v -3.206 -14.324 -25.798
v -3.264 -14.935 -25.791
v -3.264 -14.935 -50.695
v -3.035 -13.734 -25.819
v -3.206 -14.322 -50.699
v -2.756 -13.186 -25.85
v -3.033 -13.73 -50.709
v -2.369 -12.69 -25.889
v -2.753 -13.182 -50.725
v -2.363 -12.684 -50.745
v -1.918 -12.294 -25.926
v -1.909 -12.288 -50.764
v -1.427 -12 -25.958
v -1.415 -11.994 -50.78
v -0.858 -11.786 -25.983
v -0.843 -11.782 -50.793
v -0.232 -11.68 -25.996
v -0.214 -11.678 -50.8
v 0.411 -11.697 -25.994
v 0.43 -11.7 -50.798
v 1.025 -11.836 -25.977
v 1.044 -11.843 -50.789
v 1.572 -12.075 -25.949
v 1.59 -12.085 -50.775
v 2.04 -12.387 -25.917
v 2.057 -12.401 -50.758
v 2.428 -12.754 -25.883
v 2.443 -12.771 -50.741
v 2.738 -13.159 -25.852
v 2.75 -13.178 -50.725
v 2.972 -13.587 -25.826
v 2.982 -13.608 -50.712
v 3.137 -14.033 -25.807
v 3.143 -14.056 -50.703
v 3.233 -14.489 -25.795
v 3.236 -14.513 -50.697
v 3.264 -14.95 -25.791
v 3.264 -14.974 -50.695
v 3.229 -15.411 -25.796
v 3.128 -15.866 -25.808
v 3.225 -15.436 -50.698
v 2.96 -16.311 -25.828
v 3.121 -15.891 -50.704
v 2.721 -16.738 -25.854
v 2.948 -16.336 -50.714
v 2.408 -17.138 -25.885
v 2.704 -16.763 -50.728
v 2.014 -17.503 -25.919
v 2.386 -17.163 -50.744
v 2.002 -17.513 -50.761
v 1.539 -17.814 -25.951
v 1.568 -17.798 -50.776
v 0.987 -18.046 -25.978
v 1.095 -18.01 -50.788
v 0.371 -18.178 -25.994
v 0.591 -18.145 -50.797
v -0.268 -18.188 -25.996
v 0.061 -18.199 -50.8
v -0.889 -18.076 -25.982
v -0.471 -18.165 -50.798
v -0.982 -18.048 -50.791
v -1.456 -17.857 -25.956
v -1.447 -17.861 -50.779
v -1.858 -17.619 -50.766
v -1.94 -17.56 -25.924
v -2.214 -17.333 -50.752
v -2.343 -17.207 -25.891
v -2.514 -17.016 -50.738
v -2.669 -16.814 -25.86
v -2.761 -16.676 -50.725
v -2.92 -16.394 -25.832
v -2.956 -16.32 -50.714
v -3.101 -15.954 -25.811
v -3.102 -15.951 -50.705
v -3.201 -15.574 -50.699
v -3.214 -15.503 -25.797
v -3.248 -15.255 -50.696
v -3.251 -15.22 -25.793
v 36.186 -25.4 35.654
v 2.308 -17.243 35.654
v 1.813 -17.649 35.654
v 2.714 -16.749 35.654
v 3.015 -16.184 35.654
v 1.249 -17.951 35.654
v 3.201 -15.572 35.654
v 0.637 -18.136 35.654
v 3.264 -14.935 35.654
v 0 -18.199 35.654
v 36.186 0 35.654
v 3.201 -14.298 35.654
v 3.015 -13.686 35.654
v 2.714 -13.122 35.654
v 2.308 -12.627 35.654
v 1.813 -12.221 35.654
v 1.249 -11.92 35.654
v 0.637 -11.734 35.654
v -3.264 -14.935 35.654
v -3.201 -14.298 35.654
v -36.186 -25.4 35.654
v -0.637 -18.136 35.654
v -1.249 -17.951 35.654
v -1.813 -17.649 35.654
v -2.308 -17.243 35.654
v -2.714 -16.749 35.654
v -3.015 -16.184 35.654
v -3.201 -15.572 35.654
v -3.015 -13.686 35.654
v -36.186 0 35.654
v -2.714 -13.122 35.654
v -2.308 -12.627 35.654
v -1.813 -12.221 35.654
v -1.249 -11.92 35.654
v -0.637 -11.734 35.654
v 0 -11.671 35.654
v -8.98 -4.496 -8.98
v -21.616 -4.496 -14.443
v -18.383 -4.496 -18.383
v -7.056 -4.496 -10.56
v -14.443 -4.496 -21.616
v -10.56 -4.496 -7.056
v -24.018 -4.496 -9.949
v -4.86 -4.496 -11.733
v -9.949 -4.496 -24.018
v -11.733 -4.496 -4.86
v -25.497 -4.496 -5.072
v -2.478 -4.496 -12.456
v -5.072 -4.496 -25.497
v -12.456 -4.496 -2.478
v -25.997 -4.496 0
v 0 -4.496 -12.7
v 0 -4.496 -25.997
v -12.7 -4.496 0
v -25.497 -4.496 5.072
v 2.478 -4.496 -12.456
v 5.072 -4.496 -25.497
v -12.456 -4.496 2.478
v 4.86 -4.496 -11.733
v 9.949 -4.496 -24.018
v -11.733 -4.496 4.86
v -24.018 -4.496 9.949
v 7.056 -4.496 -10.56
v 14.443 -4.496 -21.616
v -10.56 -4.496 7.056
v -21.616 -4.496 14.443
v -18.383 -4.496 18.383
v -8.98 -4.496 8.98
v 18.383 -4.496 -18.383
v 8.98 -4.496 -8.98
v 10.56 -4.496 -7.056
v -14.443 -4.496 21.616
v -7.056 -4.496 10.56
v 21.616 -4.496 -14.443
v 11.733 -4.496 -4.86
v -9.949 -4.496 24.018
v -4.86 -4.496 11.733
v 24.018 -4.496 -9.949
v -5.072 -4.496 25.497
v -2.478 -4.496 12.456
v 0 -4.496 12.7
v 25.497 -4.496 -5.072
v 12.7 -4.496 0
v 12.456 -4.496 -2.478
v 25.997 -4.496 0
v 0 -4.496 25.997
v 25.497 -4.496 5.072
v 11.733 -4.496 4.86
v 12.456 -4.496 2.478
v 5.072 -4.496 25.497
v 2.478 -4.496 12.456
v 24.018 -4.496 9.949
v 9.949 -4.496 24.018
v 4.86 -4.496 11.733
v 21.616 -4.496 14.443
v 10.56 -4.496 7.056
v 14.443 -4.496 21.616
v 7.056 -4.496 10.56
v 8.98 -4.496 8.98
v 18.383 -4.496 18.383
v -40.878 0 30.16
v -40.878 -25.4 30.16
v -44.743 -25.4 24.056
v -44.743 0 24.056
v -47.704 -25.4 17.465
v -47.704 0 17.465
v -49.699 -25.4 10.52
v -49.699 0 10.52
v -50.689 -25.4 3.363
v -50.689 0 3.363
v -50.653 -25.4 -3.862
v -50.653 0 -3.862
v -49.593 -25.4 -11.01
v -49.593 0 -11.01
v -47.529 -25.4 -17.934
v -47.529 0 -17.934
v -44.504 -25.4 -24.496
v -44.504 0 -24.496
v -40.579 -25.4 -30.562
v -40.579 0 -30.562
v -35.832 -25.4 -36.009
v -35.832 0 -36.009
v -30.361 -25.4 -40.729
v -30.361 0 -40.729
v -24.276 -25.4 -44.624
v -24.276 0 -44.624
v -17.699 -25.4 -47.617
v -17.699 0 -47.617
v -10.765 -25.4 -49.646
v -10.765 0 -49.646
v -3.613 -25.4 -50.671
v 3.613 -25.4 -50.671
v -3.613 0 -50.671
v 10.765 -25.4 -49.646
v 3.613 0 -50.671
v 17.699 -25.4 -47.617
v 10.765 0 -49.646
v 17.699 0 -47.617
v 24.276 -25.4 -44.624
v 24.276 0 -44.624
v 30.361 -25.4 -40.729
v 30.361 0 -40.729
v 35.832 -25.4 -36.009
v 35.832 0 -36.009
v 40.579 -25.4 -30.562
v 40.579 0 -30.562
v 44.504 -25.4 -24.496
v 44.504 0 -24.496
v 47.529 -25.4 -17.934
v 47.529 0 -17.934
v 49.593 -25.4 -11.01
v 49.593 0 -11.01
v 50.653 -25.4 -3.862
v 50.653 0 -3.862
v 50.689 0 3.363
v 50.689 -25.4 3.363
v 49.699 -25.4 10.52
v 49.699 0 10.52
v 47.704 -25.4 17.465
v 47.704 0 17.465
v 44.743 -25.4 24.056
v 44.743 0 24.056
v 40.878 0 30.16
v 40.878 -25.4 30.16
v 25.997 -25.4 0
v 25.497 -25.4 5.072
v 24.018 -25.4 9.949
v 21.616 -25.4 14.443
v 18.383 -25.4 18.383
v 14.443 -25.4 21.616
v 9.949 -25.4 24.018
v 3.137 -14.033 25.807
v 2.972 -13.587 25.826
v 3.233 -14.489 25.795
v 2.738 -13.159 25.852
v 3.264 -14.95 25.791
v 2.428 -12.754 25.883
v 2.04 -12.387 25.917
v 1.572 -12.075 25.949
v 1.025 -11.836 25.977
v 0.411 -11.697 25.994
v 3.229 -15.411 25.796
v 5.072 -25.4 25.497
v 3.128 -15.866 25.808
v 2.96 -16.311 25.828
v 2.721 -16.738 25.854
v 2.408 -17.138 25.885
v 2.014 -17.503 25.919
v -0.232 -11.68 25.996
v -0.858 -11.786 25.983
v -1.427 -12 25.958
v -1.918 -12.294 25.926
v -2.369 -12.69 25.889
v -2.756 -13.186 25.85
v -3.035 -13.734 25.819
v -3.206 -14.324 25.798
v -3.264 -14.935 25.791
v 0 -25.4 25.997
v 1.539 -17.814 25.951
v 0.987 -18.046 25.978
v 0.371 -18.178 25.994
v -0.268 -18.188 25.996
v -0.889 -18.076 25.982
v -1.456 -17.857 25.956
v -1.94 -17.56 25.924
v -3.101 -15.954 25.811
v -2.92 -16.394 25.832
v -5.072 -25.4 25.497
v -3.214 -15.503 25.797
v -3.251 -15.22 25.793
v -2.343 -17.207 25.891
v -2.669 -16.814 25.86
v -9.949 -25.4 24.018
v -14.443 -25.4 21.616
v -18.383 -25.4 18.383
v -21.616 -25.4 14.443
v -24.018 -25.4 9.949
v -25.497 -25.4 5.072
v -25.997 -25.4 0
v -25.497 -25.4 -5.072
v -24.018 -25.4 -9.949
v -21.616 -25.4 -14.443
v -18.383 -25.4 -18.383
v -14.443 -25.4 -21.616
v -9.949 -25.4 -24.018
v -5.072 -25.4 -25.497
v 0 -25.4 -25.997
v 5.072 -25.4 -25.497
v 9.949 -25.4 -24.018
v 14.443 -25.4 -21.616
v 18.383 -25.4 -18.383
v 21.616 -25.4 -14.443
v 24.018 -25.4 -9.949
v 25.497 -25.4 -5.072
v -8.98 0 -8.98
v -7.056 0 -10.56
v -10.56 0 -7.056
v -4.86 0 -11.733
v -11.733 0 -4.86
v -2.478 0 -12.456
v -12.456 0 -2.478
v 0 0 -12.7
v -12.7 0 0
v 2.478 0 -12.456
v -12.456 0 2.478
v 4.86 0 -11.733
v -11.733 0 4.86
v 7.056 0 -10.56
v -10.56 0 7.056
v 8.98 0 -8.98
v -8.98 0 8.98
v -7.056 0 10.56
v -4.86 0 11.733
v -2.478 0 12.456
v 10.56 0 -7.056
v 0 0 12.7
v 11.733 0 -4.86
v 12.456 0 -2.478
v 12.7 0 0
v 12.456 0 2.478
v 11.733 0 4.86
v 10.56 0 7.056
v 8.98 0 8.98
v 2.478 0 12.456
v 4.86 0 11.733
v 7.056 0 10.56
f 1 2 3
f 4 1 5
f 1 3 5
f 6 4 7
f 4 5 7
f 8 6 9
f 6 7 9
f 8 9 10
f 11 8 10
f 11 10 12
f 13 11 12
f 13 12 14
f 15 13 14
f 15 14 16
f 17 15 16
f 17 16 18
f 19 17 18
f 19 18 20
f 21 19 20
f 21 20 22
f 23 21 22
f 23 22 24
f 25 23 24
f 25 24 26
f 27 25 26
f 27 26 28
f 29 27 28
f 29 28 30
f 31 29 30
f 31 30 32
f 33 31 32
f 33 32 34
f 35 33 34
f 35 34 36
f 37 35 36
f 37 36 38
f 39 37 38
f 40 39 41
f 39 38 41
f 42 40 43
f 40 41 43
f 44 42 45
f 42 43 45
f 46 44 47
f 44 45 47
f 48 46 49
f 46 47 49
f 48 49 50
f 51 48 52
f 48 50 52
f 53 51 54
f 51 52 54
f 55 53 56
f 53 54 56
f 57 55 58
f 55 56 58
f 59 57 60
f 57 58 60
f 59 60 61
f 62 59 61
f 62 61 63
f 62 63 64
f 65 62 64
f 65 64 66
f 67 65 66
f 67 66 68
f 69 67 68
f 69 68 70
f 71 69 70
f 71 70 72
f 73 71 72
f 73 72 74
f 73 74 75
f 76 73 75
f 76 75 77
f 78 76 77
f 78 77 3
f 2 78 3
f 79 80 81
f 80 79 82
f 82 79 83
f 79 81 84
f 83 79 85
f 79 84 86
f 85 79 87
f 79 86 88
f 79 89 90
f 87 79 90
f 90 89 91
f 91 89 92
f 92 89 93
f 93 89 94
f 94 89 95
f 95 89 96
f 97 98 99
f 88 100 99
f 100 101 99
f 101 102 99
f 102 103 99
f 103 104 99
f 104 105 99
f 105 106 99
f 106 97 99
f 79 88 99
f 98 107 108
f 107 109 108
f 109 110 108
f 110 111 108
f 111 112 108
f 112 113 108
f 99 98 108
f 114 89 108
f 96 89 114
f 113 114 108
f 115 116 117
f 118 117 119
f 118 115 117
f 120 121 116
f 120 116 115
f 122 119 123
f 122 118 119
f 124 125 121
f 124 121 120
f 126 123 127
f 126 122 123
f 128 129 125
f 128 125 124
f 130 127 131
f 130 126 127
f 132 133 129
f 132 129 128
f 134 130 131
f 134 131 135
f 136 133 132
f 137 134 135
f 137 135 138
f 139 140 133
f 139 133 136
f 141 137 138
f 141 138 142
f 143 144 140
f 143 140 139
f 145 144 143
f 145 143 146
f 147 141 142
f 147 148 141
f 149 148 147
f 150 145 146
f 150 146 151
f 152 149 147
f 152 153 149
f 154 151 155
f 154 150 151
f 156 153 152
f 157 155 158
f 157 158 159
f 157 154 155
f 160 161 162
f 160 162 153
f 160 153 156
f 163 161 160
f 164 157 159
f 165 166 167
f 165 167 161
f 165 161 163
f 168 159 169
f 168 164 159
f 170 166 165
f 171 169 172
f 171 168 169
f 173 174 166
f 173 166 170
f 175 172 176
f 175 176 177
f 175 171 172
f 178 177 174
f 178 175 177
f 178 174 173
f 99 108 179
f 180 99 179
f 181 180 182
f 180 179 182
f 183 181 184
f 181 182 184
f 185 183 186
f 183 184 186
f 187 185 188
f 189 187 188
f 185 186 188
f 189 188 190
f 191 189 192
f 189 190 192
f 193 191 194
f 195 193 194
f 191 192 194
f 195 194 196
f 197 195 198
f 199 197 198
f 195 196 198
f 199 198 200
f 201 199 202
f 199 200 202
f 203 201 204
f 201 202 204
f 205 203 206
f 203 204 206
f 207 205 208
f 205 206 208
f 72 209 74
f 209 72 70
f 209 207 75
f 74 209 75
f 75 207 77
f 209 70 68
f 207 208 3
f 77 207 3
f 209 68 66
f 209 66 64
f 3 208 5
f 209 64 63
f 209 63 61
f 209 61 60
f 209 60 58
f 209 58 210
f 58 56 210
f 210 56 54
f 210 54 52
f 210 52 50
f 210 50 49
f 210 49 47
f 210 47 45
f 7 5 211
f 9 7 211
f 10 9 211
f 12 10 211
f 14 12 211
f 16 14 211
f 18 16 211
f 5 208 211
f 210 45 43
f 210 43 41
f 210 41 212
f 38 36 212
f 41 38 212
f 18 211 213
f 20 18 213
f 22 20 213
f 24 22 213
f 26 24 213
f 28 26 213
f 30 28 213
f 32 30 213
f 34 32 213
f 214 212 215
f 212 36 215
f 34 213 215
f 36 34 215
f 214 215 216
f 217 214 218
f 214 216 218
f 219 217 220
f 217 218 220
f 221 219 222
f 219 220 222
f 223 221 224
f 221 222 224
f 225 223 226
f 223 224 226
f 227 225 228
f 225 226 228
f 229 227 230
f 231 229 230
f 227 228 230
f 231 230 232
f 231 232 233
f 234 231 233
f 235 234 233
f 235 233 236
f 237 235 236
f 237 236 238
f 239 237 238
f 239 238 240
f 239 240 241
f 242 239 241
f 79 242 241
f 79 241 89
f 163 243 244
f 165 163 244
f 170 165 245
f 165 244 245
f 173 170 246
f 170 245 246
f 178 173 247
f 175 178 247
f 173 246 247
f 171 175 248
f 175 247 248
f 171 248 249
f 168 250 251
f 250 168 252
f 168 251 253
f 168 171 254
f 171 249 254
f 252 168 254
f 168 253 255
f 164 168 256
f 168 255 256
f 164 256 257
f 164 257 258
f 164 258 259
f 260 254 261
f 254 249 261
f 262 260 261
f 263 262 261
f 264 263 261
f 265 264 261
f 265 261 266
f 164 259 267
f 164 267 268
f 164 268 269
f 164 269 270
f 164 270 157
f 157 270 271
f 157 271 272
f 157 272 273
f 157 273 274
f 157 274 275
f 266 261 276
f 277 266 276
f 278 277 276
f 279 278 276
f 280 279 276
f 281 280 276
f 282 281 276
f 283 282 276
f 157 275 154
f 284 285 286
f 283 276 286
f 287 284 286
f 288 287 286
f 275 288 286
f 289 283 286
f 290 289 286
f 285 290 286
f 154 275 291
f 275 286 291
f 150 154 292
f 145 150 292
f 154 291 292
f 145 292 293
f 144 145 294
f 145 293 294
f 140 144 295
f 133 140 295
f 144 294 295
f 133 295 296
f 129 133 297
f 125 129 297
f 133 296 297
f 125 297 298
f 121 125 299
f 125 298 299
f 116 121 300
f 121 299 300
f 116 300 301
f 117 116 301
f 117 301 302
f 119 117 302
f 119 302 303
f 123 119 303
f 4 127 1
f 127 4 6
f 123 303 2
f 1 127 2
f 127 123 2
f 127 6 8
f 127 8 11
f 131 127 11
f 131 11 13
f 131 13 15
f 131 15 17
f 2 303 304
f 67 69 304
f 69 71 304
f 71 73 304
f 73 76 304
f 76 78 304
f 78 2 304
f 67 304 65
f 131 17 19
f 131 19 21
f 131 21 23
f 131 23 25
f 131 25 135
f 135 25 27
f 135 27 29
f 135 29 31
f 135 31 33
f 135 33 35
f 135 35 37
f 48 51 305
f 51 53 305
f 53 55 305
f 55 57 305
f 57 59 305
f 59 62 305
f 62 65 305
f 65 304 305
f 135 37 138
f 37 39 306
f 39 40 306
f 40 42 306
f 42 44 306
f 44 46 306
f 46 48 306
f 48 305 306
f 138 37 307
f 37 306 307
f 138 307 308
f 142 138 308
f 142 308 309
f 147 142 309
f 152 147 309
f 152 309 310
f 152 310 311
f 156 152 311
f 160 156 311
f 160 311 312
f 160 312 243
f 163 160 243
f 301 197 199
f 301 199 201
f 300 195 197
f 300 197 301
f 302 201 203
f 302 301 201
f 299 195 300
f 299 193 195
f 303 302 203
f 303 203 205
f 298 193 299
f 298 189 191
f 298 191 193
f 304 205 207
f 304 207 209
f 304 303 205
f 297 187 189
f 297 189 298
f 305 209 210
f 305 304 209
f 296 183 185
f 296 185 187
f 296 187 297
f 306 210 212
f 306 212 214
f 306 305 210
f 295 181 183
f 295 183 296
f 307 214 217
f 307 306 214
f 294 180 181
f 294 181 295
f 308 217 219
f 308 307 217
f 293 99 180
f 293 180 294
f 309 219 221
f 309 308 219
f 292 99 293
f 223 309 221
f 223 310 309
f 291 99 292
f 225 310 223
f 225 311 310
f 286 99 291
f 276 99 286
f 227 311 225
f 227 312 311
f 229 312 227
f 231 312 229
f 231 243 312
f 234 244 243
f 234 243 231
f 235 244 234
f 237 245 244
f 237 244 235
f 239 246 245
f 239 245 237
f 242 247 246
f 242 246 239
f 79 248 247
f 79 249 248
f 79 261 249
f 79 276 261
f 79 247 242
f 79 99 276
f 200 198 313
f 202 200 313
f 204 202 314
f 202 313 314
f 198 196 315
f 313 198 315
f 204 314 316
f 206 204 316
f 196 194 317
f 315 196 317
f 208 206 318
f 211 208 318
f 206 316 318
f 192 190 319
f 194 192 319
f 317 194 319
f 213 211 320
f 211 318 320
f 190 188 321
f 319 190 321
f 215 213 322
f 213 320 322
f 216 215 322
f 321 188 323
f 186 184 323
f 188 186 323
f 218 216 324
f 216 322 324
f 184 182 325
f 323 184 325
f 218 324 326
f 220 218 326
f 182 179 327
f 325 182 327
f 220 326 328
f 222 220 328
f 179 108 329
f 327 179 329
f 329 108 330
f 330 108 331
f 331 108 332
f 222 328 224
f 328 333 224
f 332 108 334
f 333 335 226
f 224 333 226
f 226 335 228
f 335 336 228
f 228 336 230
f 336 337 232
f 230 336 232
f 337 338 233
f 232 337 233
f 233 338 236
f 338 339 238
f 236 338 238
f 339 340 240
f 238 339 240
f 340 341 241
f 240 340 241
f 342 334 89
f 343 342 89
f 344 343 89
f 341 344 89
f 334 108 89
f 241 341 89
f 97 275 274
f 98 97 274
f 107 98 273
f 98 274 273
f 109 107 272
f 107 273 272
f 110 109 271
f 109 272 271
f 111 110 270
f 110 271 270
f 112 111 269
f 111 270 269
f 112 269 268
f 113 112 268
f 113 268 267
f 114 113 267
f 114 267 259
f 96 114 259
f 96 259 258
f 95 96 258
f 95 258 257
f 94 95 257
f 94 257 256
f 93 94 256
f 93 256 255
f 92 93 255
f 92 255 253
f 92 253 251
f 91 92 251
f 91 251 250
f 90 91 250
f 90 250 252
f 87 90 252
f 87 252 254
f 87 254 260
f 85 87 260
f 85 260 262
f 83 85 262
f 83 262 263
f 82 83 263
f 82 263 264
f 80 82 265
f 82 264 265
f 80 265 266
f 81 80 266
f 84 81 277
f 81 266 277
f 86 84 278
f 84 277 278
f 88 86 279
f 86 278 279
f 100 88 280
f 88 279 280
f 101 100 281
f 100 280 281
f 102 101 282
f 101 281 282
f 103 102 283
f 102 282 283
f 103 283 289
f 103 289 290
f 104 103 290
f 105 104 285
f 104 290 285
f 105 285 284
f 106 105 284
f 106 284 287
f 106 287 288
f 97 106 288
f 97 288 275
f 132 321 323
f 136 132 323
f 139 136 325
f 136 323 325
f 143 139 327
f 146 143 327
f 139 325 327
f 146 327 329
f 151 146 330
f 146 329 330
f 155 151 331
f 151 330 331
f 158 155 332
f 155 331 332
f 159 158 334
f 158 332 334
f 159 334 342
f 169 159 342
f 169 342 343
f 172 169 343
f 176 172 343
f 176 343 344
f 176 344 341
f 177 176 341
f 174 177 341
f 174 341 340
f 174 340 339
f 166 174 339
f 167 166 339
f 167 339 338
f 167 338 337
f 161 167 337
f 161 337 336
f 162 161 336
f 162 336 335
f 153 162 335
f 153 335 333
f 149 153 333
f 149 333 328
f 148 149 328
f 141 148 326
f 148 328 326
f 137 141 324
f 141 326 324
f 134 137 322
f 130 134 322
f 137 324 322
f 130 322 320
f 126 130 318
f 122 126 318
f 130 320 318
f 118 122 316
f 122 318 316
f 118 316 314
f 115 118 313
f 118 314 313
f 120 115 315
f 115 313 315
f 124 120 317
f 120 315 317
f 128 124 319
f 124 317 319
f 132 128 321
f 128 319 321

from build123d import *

# Parameters (mm, degrees)
F1_DEPTH = 25.4
F3_R     = 25.9969
F4_DEPTH = 20.9042
F2_R     = 25.9969
F5_DEPTH = 20.9042
F7_D     = 25.4
F7_DEPTH = 21.0058
F7_TIP   = 7.6309298617
F10_D    = 6.5278


with BuildPart() as f1:
    # F0 (on Front) → F1 (new body)
    with BuildSketch(Plane.XZ):
        with BuildLine():
            Line((36.1855936237, 35.6544922009), (-36.1855936237, 35.6544922009))
            ThreePointArc((-36.1855936237, 35.6544922009), (0, -50.8), (36.1855936237, 35.6544922009))
        make_face()
    extrude(amount=F1_DEPTH)

    # F3 (on face) → F4 (join)
    with BuildSketch(Plane.XZ.offset(25.4)):
        Circle(F3_R)
    extrude(amount=-F4_DEPTH)

    # F2 (on face) → F5 (cut)
    with BuildSketch(Plane.XZ.offset(25.4)):
        Circle(F2_R)
    extrude(amount=-F5_DEPTH, mode=Mode.SUBTRACT)

    # F7
    with Locations(Plane.XZ.offset(4.4958)):
        with Locations((0, 0)):
            Hole(F7_D / 2, depth=F7_DEPTH)
            with Locations((0, 0, -(F7_DEPTH + F7_TIP / 2))):  # 118° drill point
                Cone(0, F7_D / 2, F7_TIP, mode=Mode.SUBTRACT)

    # F10 (through all)
    with Locations(Plane.XY.offset(35.6544922009)):
        with Locations((0, -14.9352)):
            Hole(F10_D / 2)


solid = f1.part
